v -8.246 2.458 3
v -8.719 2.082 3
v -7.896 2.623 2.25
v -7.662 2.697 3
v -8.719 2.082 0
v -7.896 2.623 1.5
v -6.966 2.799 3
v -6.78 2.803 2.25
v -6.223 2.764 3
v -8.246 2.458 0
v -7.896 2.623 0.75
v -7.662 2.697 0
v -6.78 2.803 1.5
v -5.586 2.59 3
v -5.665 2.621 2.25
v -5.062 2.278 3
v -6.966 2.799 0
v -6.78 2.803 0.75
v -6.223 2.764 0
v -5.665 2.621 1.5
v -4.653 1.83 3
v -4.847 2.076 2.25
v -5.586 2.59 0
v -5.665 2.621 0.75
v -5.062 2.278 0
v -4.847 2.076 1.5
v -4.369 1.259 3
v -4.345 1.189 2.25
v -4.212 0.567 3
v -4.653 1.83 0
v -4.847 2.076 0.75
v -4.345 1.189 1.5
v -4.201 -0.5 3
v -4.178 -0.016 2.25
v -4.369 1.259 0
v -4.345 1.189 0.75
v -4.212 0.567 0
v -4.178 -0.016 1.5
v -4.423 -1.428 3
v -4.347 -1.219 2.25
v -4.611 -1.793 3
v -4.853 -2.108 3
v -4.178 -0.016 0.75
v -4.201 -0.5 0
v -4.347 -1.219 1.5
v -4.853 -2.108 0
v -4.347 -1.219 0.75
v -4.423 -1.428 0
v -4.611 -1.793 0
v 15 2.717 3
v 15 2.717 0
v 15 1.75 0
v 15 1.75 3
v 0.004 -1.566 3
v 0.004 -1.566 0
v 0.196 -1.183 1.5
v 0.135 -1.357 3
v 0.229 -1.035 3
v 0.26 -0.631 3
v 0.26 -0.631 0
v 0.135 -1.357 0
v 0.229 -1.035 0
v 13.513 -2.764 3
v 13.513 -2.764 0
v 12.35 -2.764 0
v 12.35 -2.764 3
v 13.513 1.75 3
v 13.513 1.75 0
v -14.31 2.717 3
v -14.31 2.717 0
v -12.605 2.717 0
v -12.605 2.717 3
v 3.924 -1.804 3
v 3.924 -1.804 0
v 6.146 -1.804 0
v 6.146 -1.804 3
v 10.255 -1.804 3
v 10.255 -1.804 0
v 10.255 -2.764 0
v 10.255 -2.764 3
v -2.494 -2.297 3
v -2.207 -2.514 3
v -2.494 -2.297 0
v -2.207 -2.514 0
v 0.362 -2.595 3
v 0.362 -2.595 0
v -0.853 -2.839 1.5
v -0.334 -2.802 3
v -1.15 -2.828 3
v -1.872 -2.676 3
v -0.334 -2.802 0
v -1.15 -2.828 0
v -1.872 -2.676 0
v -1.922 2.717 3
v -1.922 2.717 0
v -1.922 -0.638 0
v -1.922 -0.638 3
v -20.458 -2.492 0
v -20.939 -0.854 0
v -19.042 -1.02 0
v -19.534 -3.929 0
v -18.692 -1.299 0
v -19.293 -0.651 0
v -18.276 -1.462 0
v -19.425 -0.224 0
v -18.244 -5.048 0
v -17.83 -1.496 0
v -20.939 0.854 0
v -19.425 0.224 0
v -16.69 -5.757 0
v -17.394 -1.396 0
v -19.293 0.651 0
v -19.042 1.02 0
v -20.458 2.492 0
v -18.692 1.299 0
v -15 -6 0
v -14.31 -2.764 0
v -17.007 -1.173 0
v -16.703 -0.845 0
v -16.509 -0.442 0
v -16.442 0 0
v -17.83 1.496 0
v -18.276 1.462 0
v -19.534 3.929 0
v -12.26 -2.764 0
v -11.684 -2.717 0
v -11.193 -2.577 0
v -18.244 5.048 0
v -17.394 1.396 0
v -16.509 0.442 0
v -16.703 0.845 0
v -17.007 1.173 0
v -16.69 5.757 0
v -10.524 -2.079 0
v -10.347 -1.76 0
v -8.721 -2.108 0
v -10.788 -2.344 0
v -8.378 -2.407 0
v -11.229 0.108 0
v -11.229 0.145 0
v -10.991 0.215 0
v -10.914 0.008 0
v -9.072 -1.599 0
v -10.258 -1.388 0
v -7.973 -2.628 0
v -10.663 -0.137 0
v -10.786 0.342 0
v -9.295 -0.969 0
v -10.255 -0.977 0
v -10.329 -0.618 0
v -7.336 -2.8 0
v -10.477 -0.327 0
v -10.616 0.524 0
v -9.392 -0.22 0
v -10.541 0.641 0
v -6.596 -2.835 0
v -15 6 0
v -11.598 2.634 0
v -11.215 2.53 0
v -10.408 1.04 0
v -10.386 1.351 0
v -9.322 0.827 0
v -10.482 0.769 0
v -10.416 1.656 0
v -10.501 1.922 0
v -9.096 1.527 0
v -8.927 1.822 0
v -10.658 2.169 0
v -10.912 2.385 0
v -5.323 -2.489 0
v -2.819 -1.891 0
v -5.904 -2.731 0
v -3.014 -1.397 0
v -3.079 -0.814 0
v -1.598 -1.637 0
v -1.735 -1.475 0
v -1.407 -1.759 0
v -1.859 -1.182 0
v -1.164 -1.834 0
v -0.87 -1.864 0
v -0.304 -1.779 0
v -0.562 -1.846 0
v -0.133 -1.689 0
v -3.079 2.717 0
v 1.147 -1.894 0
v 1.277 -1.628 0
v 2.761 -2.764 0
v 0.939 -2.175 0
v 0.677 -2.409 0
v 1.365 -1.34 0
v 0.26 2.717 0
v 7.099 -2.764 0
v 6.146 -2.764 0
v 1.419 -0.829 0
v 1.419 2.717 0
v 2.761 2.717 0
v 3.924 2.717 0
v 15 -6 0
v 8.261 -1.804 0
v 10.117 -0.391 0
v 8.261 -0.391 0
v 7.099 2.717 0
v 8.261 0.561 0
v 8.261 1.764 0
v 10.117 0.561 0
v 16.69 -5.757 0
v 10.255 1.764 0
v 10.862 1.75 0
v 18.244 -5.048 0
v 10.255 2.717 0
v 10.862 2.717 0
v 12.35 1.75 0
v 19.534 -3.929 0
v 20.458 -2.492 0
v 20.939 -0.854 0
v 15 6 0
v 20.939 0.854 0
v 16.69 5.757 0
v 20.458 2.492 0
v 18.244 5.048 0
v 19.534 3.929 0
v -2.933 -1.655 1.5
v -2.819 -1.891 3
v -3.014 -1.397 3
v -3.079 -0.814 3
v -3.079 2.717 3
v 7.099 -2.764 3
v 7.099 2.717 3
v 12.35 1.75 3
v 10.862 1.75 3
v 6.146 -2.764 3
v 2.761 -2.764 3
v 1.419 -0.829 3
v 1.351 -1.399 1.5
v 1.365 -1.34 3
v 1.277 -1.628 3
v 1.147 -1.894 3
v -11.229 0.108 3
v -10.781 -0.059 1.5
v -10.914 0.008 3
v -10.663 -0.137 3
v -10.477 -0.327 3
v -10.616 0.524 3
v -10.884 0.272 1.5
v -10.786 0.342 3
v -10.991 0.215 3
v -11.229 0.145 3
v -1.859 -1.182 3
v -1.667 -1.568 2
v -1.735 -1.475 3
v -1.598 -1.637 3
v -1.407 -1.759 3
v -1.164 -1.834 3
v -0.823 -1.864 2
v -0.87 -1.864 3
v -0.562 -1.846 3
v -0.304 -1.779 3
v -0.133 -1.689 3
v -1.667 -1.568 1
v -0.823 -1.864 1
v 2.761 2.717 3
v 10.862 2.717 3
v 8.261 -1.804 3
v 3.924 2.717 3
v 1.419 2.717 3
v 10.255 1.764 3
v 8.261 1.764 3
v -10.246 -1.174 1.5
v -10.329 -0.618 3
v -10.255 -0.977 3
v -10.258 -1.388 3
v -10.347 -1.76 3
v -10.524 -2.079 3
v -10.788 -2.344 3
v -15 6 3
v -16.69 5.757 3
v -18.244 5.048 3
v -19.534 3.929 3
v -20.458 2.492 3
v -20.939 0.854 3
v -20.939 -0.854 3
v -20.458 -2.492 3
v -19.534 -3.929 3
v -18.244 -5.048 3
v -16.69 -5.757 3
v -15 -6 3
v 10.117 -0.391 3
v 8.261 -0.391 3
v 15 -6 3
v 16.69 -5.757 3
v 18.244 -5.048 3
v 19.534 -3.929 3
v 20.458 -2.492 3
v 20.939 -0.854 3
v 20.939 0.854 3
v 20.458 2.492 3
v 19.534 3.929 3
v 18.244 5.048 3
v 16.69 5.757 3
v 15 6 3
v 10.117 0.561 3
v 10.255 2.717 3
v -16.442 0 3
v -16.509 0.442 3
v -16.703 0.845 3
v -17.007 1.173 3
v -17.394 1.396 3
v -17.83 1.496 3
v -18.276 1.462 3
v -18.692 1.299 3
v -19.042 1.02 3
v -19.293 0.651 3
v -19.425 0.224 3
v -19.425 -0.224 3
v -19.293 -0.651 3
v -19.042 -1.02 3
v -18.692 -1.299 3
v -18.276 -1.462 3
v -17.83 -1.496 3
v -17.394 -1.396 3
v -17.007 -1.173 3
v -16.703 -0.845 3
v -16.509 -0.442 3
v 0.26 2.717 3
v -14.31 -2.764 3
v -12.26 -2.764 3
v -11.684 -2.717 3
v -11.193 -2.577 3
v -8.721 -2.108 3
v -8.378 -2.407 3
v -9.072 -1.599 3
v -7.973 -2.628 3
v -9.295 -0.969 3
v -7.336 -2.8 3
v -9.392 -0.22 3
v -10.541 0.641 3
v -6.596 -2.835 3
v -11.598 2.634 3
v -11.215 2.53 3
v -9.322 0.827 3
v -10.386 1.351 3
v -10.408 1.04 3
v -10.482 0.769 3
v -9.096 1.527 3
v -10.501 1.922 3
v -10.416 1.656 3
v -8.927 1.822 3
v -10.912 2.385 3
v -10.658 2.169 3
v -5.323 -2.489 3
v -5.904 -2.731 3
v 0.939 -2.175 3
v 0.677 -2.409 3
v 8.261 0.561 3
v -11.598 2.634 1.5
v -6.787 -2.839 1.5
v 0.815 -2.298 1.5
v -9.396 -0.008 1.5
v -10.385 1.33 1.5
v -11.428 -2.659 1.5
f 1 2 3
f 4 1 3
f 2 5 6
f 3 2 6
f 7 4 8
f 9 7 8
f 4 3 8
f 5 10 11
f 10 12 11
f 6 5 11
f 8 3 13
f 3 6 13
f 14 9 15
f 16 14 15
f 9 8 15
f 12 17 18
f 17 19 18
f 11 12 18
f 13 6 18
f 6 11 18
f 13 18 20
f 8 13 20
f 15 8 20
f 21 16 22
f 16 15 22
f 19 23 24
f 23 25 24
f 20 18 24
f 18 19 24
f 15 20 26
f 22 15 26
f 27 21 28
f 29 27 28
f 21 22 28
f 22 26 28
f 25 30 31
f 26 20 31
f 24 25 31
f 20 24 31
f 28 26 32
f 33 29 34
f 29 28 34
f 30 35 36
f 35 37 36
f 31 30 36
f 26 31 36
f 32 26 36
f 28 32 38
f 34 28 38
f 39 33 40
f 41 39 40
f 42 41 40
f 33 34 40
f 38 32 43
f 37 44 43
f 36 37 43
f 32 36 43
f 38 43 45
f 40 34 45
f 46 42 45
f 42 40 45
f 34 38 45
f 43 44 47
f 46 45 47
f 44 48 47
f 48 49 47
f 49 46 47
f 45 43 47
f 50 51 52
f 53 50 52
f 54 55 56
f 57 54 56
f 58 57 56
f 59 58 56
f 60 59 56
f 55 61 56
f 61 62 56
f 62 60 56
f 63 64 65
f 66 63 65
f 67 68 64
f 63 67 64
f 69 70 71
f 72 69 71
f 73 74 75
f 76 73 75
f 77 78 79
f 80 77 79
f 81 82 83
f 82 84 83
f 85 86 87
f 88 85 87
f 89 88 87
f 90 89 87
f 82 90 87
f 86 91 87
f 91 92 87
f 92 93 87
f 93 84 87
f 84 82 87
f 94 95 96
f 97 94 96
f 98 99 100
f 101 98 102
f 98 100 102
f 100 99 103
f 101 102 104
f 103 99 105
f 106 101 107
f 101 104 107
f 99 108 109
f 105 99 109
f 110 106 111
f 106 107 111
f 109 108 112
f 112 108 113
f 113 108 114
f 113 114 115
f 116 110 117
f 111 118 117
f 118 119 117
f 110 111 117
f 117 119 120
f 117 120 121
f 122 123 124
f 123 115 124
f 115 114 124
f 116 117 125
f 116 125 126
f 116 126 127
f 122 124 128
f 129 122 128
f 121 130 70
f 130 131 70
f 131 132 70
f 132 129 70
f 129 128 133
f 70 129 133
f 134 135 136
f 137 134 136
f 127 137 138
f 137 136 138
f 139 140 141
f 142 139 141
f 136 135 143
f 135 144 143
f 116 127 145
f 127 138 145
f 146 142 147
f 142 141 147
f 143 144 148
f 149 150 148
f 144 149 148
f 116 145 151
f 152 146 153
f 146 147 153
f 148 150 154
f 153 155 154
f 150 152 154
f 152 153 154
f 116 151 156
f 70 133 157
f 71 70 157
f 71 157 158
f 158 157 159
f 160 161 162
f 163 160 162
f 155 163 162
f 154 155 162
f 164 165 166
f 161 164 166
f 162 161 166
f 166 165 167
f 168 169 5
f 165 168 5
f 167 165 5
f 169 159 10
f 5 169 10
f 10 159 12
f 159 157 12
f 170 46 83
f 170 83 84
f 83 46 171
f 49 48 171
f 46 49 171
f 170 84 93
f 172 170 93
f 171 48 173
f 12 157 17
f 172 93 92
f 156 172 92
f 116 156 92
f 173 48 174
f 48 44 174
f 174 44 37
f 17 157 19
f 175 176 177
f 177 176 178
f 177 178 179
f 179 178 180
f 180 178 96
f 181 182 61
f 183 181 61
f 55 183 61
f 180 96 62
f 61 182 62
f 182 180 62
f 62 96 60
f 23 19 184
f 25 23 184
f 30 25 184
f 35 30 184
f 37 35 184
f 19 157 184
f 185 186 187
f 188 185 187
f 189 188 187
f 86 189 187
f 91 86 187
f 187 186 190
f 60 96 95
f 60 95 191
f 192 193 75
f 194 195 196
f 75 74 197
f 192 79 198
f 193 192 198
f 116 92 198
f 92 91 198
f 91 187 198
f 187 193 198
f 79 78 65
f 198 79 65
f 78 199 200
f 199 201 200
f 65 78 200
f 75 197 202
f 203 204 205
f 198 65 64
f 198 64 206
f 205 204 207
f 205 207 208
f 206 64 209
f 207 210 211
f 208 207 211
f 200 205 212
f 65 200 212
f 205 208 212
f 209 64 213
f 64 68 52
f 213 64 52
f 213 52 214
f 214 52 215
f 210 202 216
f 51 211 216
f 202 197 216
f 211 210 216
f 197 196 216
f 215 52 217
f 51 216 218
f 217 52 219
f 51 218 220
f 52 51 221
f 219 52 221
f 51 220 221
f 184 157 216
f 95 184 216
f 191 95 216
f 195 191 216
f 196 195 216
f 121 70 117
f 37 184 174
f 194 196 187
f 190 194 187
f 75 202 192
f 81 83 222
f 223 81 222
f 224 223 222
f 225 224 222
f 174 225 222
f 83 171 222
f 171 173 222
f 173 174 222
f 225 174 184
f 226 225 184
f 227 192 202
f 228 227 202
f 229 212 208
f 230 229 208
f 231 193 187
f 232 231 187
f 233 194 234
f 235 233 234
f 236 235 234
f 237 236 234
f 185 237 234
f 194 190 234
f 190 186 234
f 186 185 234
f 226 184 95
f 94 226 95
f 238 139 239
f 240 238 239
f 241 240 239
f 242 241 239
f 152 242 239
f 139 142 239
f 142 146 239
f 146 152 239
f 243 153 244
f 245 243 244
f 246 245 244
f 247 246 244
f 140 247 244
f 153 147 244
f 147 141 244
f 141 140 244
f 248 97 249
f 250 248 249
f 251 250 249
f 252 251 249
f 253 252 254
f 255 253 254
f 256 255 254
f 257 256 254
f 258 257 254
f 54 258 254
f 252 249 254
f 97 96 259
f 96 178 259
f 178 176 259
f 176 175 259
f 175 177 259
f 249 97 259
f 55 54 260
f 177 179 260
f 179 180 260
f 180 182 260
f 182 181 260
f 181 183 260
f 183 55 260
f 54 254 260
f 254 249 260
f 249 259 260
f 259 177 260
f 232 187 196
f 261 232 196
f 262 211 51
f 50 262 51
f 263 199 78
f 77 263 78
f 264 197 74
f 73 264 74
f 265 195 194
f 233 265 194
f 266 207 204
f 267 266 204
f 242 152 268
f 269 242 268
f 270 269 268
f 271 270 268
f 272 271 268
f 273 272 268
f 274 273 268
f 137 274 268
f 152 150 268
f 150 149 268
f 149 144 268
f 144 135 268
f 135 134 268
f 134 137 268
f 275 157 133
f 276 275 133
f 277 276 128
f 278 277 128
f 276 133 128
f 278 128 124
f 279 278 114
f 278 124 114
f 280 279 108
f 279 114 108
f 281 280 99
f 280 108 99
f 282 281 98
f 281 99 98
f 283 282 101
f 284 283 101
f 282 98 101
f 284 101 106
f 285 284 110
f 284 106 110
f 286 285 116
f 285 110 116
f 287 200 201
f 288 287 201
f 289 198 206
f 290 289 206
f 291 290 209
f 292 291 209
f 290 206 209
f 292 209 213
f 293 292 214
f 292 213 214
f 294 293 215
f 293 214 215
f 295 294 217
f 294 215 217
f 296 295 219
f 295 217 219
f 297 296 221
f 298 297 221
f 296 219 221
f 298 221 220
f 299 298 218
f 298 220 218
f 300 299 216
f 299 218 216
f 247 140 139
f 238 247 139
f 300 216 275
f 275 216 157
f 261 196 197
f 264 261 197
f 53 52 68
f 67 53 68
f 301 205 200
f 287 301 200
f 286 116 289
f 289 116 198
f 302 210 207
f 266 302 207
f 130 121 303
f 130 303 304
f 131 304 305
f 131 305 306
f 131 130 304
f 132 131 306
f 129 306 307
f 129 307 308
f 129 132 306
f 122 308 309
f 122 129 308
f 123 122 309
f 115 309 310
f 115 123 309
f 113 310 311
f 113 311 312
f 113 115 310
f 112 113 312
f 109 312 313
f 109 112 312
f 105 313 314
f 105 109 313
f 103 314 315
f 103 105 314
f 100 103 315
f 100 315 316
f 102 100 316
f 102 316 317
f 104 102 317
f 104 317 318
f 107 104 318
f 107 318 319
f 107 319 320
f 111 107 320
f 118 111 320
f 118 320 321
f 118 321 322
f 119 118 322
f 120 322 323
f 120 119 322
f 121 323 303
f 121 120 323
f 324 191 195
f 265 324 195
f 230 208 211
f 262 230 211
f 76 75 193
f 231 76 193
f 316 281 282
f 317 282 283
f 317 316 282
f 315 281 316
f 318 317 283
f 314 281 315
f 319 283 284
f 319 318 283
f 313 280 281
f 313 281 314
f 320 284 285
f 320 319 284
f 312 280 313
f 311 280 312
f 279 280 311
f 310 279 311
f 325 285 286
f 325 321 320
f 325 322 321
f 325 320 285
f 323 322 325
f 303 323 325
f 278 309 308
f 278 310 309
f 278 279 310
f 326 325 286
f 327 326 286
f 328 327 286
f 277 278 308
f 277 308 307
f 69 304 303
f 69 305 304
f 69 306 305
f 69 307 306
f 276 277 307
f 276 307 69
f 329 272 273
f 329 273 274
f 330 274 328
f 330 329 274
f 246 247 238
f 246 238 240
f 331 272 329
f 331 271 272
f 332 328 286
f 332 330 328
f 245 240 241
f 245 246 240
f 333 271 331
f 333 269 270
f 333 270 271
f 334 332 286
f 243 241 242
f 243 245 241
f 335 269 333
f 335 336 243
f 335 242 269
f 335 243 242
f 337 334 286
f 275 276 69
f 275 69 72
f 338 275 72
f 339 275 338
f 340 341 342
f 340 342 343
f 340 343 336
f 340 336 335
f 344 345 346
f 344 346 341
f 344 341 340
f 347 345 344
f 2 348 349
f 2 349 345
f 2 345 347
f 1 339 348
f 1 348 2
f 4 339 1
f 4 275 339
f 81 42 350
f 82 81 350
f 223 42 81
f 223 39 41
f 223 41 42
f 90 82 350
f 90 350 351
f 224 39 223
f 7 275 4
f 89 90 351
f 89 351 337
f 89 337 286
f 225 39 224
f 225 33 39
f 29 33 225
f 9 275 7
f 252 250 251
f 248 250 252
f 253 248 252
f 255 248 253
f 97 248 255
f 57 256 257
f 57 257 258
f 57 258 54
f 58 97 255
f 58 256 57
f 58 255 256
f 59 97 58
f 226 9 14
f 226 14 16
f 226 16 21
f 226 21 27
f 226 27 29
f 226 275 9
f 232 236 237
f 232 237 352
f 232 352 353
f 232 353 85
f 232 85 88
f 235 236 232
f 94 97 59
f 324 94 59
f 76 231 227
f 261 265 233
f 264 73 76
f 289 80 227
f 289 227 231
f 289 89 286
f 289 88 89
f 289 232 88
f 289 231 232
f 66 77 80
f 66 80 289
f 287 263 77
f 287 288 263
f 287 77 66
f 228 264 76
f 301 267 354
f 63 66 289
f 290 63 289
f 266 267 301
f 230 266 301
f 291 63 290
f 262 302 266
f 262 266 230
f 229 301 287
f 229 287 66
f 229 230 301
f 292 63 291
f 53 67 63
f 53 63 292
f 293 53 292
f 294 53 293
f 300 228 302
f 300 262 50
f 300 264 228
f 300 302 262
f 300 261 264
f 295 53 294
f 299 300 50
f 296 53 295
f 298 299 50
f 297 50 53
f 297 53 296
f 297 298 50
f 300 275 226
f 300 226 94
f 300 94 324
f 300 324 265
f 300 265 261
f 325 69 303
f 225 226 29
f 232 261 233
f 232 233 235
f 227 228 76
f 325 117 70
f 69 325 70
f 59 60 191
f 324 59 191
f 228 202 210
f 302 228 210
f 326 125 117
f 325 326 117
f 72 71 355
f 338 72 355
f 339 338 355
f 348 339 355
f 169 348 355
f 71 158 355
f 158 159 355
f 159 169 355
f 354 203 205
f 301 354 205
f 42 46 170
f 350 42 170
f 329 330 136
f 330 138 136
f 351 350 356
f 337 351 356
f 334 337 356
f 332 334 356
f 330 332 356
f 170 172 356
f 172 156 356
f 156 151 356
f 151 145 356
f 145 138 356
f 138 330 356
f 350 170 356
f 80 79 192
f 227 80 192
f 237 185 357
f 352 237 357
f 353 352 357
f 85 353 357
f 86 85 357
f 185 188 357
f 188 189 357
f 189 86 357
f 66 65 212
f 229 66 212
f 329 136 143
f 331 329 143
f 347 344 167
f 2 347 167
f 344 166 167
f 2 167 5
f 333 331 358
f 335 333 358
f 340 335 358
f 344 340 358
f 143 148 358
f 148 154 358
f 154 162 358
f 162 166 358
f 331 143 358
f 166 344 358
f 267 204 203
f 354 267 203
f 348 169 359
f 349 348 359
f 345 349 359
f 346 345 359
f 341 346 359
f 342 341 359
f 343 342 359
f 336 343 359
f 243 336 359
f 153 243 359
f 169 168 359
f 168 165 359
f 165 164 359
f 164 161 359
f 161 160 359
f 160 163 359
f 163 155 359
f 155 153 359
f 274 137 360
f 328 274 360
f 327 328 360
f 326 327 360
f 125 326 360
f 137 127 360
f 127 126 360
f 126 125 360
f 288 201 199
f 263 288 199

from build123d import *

# Parameters (mm, degrees)
F0_R     = 1.5
F1_DEPTH = 3


with BuildPart() as f1:
    # F0 (on Top) → F1 (new body)
    with BuildSketch(Plane.XY):
        with BuildLine():
            Line((-15, -6), (-15, 6))
            ThreePointArc((-15, 6), (-21, 0), (-15, -6))
        make_face()
        with Locations((-17.9419908673, 0)):
            Circle(F0_R, mode=Mode.SUBTRACT)
        Polygon((15, 6), (-15, 6), (-15, -6), (15, -6), (15, 1.75009996), (13.512594962, 1.75009996), (13.512594962, -2.7636945222), (12.350259896, -2.7636945222), (12.350259896, 1.75009996), (10.8616553379, 1.75009996), (10.8616553379, 2.7169132347), (15, 2.7169132347), align=None)
        with BuildLine():
            Line((-14.3102758896, -2.7636945222), (-14.3102758896, 2.7169132347))
            Line((-14.3102758896, 2.7169132347), (-12.6045581767, 2.7169132347))
            add(Edge.make_bspline(
                [(-12.6045581767, 2.7169132347), (-11.4386245502, 2.7169132347), (-10.9120351859, 2.3852459016)],
                knots=[0, 0, 0, 1, 1, 1], degree=2))
            add(Edge.make_bspline(
                [(-10.9120351859, 2.3852459016), (-10.3854458217, 2.0535785686), (-10.3854458217, 1.3302678928)],
                knots=[0, 0, 0, 1, 1, 1], degree=2))
            add(Edge.make_bspline(
                [(-10.3854458217, 1.3302678928), (-10.3854458217, 0.8384646142), (-10.6157536985, 0.5235905638)],
                knots=[0, 0, 0, 1, 1, 1], degree=2))
            add(Edge.make_bspline(
                [(-10.6157536985, 0.5235905638), (-10.8460615754, 0.2087165134), (-11.2287085166, 0.1451419432)],
                knots=[0, 0, 0, 1, 1, 1], degree=2))
            Line((-11.2287085166, 0.1451419432), (-11.2287085166, 0.1079568173))
            add(Edge.make_bspline(
                [(-11.2287085166, 0.1079568173), (-10.7081167533, -0.0083966413), (-10.4772091164, -0.3268692523)],
                knots=[0, 0, 0, 1, 1, 1], degree=2))
            add(Edge.make_bspline(
                [(-10.4772091164, -0.3268692523), (-10.2463014794, -0.6453418633), (-10.2463014794, -1.1743302679)],
                knots=[0, 0, 0, 1, 1, 1], degree=2))
            add(Edge.make_bspline(
                [(-10.2463014794, -1.1743302679), (-10.2463014794, -1.9240303878), (-10.7884846062, -2.343862455)],
                knots=[0, 0, 0, 1, 1, 1], degree=2))
            add(Edge.make_bspline(
                [(-10.7884846062, -2.343862455), (-11.3306677329, -2.7636945222), (-12.2602958816, -2.7636945222)],
                knots=[0, 0, 0, 1, 1, 1], degree=2))
            Line((-12.2602958816, -2.7636945222), (-14.3102758896, -2.7636945222))
        make_face(mode=Mode.SUBTRACT)
        with BuildLine():
            add(Edge.make_bspline(
                [(-4.8472610956, 2.0757696921), (-4.1779288285, 1.3482606957), (-4.1779288285, -0.0155937625)],
                knots=[0, 0, 0, 1, 1, 1], degree=2))
            add(Edge.make_bspline(
                [(-4.1779288285, -0.0155937625), (-4.1779288285, -1.3770491803), (-4.8526589364, -2.1081567373)],
                knots=[0, 0, 0, 1, 1, 1], degree=2))
            add(Edge.make_bspline(
                [(-4.8526589364, -2.1081567373), (-5.5273890444, -2.8392642943), (-6.7868852459, -2.8392642943)],
                knots=[0, 0, 0, 1, 1, 1], degree=2))
            add(Edge.make_bspline(
                [(-6.7868852459, -2.8392642943), (-8.0463814474, -2.8392642943), (-8.7211115554, -2.1081567373)],
                knots=[0, 0, 0, 1, 1, 1], degree=2))
            add(Edge.make_bspline(
                [(-8.7211115554, -2.1081567373), (-9.3958416633, -1.3770491803), (-9.3958416633, -0.0083966413)],
                knots=[0, 0, 0, 1, 1, 1], degree=2))
            add(Edge.make_bspline(
                [(-9.3958416633, -0.0083966413), (-9.3958416633, 1.3602558976), (-8.7193122751, 2.0817672931)],
                knots=[0, 0, 0, 1, 1, 1], degree=2))
            add(Edge.make_bspline(
                [(-8.7193122751, 2.0817672931), (-8.0427828868, 2.8032786885), (-6.7796881248, 2.8032786885)],
                knots=[0, 0, 0, 1, 1, 1], degree=2))
            add(Edge.make_bspline(
                [(-6.7796881248, 2.8032786885), (-5.5165933627, 2.8032786885), (-4.8472610956, 2.0757696921)],
                knots=[0, 0, 0, 1, 1, 1], degree=2))
        make_face(mode=Mode.SUBTRACT)
        with BuildLine():
            Line((0.2602958816, 2.7169132347), (1.419032387, 2.7169132347))
            Line((1.419032387, 2.7169132347), (1.419032387, -0.8288684526))
            add(Edge.make_bspline(
                [(1.419032387, -0.8288684526), (1.419032387, -1.4370251899), (1.1473410636, -1.894042383)],
                knots=[0, 0, 0, 1, 1, 1], degree=2))
            add(Edge.make_bspline(
                [(1.1473410636, -1.894042383), (0.8756497401, -2.3510595762), (0.3616553379, -2.5951619352)],
                knots=[0, 0, 0, 1, 1, 1], degree=2))
            add(Edge.make_bspline(
                [(0.3616553379, -2.5951619352), (-0.1523390644, -2.8392642943), (-0.8528588565, -2.8392642943)],
                knots=[0, 0, 0, 1, 1, 1], degree=2))
            add(Edge.make_bspline(
                [(-0.8528588565, -2.8392642943), (-1.9096361455, -2.8392642943), (-2.4944022391, -2.2970811675)],
                knots=[0, 0, 0, 1, 1, 1], degree=2))
            add(Edge.make_bspline(
                [(-2.4944022391, -2.2970811675), (-3.0791683327, -1.7548980408), (-3.0791683327, -0.8144742103)],
                knots=[0, 0, 0, 1, 1, 1], degree=2))
            Line((-3.0791683327, -0.8144742103), (-3.0791683327, 2.7169132347))
            Line((-3.0791683327, 2.7169132347), (-1.9216313475, 2.7169132347))
            Line((-1.9216313475, 2.7169132347), (-1.9216313475, -0.6381447421))
            add(Edge.make_bspline(
                [(-1.9216313475, -0.6381447421), (-1.9216313475, -1.2714914034), (-1.6667333067, -1.5677728908)],
                knots=[0, 0, 0, 1, 1, 1], degree=2))
            add(Edge.make_bspline(
                [(-1.6667333067, -1.5677728908), (-1.4118352659, -1.8640543782), (-0.8228708517, -1.8640543782)],
                knots=[0, 0, 0, 1, 1, 1], degree=2))
            add(Edge.make_bspline(
                [(-0.8228708517, -1.8640543782), (-0.2530987605, -1.8640543782), (0.0035985606, -1.5659736106)],
                knots=[0, 0, 0, 1, 1, 1], degree=2))
            add(Edge.make_bspline(
                [(0.0035985606, -1.5659736106), (0.2602958816, -1.2678928429), (0.2602958816, -0.630947621)],
                knots=[0, 0, 0, 1, 1, 1], degree=2))
            Line((0.2602958816, -0.630947621), (0.2602958816, 2.7169132347))
        make_face(mode=Mode.SUBTRACT)
        Polygon((6.1463414634, -2.7636945222), (2.7612954818, -2.7636945222), (2.7612954818, 2.7169132347), (3.9236305478, 2.7169132347), (3.9236305478, -1.8040783687), (6.1463414634, -1.8040783687), align=None, mode=Mode.SUBTRACT)
        Polygon((10.2546981208, -1.8040783687), (10.2546981208, -2.7636945222), (7.0987604958, -2.7636945222), (7.0987604958, 2.7169132347), (10.2546981208, 2.7169132347), (10.2546981208, 1.7644942023), (8.2610955618, 1.7644942023), (8.2610955618, 0.5613754498), (10.1167532987, 0.5613754498), (10.1167532987, -0.3910435826), (8.2610955618, -0.3910435826), (8.2610955618, -1.8040783687), align=None, mode=Mode.SUBTRACT)
        with BuildLine():
            ThreePointArc((15, -6), (21, 0), (15, 6))
            Line((15, 6), (15, 2.7169132347))
            Line((15, 2.7169132347), (15, 1.75009996))
            Line((15, 1.75009996), (15, -6))
        make_face()
    extrude(amount=F1_DEPTH)


solid = f1.part
